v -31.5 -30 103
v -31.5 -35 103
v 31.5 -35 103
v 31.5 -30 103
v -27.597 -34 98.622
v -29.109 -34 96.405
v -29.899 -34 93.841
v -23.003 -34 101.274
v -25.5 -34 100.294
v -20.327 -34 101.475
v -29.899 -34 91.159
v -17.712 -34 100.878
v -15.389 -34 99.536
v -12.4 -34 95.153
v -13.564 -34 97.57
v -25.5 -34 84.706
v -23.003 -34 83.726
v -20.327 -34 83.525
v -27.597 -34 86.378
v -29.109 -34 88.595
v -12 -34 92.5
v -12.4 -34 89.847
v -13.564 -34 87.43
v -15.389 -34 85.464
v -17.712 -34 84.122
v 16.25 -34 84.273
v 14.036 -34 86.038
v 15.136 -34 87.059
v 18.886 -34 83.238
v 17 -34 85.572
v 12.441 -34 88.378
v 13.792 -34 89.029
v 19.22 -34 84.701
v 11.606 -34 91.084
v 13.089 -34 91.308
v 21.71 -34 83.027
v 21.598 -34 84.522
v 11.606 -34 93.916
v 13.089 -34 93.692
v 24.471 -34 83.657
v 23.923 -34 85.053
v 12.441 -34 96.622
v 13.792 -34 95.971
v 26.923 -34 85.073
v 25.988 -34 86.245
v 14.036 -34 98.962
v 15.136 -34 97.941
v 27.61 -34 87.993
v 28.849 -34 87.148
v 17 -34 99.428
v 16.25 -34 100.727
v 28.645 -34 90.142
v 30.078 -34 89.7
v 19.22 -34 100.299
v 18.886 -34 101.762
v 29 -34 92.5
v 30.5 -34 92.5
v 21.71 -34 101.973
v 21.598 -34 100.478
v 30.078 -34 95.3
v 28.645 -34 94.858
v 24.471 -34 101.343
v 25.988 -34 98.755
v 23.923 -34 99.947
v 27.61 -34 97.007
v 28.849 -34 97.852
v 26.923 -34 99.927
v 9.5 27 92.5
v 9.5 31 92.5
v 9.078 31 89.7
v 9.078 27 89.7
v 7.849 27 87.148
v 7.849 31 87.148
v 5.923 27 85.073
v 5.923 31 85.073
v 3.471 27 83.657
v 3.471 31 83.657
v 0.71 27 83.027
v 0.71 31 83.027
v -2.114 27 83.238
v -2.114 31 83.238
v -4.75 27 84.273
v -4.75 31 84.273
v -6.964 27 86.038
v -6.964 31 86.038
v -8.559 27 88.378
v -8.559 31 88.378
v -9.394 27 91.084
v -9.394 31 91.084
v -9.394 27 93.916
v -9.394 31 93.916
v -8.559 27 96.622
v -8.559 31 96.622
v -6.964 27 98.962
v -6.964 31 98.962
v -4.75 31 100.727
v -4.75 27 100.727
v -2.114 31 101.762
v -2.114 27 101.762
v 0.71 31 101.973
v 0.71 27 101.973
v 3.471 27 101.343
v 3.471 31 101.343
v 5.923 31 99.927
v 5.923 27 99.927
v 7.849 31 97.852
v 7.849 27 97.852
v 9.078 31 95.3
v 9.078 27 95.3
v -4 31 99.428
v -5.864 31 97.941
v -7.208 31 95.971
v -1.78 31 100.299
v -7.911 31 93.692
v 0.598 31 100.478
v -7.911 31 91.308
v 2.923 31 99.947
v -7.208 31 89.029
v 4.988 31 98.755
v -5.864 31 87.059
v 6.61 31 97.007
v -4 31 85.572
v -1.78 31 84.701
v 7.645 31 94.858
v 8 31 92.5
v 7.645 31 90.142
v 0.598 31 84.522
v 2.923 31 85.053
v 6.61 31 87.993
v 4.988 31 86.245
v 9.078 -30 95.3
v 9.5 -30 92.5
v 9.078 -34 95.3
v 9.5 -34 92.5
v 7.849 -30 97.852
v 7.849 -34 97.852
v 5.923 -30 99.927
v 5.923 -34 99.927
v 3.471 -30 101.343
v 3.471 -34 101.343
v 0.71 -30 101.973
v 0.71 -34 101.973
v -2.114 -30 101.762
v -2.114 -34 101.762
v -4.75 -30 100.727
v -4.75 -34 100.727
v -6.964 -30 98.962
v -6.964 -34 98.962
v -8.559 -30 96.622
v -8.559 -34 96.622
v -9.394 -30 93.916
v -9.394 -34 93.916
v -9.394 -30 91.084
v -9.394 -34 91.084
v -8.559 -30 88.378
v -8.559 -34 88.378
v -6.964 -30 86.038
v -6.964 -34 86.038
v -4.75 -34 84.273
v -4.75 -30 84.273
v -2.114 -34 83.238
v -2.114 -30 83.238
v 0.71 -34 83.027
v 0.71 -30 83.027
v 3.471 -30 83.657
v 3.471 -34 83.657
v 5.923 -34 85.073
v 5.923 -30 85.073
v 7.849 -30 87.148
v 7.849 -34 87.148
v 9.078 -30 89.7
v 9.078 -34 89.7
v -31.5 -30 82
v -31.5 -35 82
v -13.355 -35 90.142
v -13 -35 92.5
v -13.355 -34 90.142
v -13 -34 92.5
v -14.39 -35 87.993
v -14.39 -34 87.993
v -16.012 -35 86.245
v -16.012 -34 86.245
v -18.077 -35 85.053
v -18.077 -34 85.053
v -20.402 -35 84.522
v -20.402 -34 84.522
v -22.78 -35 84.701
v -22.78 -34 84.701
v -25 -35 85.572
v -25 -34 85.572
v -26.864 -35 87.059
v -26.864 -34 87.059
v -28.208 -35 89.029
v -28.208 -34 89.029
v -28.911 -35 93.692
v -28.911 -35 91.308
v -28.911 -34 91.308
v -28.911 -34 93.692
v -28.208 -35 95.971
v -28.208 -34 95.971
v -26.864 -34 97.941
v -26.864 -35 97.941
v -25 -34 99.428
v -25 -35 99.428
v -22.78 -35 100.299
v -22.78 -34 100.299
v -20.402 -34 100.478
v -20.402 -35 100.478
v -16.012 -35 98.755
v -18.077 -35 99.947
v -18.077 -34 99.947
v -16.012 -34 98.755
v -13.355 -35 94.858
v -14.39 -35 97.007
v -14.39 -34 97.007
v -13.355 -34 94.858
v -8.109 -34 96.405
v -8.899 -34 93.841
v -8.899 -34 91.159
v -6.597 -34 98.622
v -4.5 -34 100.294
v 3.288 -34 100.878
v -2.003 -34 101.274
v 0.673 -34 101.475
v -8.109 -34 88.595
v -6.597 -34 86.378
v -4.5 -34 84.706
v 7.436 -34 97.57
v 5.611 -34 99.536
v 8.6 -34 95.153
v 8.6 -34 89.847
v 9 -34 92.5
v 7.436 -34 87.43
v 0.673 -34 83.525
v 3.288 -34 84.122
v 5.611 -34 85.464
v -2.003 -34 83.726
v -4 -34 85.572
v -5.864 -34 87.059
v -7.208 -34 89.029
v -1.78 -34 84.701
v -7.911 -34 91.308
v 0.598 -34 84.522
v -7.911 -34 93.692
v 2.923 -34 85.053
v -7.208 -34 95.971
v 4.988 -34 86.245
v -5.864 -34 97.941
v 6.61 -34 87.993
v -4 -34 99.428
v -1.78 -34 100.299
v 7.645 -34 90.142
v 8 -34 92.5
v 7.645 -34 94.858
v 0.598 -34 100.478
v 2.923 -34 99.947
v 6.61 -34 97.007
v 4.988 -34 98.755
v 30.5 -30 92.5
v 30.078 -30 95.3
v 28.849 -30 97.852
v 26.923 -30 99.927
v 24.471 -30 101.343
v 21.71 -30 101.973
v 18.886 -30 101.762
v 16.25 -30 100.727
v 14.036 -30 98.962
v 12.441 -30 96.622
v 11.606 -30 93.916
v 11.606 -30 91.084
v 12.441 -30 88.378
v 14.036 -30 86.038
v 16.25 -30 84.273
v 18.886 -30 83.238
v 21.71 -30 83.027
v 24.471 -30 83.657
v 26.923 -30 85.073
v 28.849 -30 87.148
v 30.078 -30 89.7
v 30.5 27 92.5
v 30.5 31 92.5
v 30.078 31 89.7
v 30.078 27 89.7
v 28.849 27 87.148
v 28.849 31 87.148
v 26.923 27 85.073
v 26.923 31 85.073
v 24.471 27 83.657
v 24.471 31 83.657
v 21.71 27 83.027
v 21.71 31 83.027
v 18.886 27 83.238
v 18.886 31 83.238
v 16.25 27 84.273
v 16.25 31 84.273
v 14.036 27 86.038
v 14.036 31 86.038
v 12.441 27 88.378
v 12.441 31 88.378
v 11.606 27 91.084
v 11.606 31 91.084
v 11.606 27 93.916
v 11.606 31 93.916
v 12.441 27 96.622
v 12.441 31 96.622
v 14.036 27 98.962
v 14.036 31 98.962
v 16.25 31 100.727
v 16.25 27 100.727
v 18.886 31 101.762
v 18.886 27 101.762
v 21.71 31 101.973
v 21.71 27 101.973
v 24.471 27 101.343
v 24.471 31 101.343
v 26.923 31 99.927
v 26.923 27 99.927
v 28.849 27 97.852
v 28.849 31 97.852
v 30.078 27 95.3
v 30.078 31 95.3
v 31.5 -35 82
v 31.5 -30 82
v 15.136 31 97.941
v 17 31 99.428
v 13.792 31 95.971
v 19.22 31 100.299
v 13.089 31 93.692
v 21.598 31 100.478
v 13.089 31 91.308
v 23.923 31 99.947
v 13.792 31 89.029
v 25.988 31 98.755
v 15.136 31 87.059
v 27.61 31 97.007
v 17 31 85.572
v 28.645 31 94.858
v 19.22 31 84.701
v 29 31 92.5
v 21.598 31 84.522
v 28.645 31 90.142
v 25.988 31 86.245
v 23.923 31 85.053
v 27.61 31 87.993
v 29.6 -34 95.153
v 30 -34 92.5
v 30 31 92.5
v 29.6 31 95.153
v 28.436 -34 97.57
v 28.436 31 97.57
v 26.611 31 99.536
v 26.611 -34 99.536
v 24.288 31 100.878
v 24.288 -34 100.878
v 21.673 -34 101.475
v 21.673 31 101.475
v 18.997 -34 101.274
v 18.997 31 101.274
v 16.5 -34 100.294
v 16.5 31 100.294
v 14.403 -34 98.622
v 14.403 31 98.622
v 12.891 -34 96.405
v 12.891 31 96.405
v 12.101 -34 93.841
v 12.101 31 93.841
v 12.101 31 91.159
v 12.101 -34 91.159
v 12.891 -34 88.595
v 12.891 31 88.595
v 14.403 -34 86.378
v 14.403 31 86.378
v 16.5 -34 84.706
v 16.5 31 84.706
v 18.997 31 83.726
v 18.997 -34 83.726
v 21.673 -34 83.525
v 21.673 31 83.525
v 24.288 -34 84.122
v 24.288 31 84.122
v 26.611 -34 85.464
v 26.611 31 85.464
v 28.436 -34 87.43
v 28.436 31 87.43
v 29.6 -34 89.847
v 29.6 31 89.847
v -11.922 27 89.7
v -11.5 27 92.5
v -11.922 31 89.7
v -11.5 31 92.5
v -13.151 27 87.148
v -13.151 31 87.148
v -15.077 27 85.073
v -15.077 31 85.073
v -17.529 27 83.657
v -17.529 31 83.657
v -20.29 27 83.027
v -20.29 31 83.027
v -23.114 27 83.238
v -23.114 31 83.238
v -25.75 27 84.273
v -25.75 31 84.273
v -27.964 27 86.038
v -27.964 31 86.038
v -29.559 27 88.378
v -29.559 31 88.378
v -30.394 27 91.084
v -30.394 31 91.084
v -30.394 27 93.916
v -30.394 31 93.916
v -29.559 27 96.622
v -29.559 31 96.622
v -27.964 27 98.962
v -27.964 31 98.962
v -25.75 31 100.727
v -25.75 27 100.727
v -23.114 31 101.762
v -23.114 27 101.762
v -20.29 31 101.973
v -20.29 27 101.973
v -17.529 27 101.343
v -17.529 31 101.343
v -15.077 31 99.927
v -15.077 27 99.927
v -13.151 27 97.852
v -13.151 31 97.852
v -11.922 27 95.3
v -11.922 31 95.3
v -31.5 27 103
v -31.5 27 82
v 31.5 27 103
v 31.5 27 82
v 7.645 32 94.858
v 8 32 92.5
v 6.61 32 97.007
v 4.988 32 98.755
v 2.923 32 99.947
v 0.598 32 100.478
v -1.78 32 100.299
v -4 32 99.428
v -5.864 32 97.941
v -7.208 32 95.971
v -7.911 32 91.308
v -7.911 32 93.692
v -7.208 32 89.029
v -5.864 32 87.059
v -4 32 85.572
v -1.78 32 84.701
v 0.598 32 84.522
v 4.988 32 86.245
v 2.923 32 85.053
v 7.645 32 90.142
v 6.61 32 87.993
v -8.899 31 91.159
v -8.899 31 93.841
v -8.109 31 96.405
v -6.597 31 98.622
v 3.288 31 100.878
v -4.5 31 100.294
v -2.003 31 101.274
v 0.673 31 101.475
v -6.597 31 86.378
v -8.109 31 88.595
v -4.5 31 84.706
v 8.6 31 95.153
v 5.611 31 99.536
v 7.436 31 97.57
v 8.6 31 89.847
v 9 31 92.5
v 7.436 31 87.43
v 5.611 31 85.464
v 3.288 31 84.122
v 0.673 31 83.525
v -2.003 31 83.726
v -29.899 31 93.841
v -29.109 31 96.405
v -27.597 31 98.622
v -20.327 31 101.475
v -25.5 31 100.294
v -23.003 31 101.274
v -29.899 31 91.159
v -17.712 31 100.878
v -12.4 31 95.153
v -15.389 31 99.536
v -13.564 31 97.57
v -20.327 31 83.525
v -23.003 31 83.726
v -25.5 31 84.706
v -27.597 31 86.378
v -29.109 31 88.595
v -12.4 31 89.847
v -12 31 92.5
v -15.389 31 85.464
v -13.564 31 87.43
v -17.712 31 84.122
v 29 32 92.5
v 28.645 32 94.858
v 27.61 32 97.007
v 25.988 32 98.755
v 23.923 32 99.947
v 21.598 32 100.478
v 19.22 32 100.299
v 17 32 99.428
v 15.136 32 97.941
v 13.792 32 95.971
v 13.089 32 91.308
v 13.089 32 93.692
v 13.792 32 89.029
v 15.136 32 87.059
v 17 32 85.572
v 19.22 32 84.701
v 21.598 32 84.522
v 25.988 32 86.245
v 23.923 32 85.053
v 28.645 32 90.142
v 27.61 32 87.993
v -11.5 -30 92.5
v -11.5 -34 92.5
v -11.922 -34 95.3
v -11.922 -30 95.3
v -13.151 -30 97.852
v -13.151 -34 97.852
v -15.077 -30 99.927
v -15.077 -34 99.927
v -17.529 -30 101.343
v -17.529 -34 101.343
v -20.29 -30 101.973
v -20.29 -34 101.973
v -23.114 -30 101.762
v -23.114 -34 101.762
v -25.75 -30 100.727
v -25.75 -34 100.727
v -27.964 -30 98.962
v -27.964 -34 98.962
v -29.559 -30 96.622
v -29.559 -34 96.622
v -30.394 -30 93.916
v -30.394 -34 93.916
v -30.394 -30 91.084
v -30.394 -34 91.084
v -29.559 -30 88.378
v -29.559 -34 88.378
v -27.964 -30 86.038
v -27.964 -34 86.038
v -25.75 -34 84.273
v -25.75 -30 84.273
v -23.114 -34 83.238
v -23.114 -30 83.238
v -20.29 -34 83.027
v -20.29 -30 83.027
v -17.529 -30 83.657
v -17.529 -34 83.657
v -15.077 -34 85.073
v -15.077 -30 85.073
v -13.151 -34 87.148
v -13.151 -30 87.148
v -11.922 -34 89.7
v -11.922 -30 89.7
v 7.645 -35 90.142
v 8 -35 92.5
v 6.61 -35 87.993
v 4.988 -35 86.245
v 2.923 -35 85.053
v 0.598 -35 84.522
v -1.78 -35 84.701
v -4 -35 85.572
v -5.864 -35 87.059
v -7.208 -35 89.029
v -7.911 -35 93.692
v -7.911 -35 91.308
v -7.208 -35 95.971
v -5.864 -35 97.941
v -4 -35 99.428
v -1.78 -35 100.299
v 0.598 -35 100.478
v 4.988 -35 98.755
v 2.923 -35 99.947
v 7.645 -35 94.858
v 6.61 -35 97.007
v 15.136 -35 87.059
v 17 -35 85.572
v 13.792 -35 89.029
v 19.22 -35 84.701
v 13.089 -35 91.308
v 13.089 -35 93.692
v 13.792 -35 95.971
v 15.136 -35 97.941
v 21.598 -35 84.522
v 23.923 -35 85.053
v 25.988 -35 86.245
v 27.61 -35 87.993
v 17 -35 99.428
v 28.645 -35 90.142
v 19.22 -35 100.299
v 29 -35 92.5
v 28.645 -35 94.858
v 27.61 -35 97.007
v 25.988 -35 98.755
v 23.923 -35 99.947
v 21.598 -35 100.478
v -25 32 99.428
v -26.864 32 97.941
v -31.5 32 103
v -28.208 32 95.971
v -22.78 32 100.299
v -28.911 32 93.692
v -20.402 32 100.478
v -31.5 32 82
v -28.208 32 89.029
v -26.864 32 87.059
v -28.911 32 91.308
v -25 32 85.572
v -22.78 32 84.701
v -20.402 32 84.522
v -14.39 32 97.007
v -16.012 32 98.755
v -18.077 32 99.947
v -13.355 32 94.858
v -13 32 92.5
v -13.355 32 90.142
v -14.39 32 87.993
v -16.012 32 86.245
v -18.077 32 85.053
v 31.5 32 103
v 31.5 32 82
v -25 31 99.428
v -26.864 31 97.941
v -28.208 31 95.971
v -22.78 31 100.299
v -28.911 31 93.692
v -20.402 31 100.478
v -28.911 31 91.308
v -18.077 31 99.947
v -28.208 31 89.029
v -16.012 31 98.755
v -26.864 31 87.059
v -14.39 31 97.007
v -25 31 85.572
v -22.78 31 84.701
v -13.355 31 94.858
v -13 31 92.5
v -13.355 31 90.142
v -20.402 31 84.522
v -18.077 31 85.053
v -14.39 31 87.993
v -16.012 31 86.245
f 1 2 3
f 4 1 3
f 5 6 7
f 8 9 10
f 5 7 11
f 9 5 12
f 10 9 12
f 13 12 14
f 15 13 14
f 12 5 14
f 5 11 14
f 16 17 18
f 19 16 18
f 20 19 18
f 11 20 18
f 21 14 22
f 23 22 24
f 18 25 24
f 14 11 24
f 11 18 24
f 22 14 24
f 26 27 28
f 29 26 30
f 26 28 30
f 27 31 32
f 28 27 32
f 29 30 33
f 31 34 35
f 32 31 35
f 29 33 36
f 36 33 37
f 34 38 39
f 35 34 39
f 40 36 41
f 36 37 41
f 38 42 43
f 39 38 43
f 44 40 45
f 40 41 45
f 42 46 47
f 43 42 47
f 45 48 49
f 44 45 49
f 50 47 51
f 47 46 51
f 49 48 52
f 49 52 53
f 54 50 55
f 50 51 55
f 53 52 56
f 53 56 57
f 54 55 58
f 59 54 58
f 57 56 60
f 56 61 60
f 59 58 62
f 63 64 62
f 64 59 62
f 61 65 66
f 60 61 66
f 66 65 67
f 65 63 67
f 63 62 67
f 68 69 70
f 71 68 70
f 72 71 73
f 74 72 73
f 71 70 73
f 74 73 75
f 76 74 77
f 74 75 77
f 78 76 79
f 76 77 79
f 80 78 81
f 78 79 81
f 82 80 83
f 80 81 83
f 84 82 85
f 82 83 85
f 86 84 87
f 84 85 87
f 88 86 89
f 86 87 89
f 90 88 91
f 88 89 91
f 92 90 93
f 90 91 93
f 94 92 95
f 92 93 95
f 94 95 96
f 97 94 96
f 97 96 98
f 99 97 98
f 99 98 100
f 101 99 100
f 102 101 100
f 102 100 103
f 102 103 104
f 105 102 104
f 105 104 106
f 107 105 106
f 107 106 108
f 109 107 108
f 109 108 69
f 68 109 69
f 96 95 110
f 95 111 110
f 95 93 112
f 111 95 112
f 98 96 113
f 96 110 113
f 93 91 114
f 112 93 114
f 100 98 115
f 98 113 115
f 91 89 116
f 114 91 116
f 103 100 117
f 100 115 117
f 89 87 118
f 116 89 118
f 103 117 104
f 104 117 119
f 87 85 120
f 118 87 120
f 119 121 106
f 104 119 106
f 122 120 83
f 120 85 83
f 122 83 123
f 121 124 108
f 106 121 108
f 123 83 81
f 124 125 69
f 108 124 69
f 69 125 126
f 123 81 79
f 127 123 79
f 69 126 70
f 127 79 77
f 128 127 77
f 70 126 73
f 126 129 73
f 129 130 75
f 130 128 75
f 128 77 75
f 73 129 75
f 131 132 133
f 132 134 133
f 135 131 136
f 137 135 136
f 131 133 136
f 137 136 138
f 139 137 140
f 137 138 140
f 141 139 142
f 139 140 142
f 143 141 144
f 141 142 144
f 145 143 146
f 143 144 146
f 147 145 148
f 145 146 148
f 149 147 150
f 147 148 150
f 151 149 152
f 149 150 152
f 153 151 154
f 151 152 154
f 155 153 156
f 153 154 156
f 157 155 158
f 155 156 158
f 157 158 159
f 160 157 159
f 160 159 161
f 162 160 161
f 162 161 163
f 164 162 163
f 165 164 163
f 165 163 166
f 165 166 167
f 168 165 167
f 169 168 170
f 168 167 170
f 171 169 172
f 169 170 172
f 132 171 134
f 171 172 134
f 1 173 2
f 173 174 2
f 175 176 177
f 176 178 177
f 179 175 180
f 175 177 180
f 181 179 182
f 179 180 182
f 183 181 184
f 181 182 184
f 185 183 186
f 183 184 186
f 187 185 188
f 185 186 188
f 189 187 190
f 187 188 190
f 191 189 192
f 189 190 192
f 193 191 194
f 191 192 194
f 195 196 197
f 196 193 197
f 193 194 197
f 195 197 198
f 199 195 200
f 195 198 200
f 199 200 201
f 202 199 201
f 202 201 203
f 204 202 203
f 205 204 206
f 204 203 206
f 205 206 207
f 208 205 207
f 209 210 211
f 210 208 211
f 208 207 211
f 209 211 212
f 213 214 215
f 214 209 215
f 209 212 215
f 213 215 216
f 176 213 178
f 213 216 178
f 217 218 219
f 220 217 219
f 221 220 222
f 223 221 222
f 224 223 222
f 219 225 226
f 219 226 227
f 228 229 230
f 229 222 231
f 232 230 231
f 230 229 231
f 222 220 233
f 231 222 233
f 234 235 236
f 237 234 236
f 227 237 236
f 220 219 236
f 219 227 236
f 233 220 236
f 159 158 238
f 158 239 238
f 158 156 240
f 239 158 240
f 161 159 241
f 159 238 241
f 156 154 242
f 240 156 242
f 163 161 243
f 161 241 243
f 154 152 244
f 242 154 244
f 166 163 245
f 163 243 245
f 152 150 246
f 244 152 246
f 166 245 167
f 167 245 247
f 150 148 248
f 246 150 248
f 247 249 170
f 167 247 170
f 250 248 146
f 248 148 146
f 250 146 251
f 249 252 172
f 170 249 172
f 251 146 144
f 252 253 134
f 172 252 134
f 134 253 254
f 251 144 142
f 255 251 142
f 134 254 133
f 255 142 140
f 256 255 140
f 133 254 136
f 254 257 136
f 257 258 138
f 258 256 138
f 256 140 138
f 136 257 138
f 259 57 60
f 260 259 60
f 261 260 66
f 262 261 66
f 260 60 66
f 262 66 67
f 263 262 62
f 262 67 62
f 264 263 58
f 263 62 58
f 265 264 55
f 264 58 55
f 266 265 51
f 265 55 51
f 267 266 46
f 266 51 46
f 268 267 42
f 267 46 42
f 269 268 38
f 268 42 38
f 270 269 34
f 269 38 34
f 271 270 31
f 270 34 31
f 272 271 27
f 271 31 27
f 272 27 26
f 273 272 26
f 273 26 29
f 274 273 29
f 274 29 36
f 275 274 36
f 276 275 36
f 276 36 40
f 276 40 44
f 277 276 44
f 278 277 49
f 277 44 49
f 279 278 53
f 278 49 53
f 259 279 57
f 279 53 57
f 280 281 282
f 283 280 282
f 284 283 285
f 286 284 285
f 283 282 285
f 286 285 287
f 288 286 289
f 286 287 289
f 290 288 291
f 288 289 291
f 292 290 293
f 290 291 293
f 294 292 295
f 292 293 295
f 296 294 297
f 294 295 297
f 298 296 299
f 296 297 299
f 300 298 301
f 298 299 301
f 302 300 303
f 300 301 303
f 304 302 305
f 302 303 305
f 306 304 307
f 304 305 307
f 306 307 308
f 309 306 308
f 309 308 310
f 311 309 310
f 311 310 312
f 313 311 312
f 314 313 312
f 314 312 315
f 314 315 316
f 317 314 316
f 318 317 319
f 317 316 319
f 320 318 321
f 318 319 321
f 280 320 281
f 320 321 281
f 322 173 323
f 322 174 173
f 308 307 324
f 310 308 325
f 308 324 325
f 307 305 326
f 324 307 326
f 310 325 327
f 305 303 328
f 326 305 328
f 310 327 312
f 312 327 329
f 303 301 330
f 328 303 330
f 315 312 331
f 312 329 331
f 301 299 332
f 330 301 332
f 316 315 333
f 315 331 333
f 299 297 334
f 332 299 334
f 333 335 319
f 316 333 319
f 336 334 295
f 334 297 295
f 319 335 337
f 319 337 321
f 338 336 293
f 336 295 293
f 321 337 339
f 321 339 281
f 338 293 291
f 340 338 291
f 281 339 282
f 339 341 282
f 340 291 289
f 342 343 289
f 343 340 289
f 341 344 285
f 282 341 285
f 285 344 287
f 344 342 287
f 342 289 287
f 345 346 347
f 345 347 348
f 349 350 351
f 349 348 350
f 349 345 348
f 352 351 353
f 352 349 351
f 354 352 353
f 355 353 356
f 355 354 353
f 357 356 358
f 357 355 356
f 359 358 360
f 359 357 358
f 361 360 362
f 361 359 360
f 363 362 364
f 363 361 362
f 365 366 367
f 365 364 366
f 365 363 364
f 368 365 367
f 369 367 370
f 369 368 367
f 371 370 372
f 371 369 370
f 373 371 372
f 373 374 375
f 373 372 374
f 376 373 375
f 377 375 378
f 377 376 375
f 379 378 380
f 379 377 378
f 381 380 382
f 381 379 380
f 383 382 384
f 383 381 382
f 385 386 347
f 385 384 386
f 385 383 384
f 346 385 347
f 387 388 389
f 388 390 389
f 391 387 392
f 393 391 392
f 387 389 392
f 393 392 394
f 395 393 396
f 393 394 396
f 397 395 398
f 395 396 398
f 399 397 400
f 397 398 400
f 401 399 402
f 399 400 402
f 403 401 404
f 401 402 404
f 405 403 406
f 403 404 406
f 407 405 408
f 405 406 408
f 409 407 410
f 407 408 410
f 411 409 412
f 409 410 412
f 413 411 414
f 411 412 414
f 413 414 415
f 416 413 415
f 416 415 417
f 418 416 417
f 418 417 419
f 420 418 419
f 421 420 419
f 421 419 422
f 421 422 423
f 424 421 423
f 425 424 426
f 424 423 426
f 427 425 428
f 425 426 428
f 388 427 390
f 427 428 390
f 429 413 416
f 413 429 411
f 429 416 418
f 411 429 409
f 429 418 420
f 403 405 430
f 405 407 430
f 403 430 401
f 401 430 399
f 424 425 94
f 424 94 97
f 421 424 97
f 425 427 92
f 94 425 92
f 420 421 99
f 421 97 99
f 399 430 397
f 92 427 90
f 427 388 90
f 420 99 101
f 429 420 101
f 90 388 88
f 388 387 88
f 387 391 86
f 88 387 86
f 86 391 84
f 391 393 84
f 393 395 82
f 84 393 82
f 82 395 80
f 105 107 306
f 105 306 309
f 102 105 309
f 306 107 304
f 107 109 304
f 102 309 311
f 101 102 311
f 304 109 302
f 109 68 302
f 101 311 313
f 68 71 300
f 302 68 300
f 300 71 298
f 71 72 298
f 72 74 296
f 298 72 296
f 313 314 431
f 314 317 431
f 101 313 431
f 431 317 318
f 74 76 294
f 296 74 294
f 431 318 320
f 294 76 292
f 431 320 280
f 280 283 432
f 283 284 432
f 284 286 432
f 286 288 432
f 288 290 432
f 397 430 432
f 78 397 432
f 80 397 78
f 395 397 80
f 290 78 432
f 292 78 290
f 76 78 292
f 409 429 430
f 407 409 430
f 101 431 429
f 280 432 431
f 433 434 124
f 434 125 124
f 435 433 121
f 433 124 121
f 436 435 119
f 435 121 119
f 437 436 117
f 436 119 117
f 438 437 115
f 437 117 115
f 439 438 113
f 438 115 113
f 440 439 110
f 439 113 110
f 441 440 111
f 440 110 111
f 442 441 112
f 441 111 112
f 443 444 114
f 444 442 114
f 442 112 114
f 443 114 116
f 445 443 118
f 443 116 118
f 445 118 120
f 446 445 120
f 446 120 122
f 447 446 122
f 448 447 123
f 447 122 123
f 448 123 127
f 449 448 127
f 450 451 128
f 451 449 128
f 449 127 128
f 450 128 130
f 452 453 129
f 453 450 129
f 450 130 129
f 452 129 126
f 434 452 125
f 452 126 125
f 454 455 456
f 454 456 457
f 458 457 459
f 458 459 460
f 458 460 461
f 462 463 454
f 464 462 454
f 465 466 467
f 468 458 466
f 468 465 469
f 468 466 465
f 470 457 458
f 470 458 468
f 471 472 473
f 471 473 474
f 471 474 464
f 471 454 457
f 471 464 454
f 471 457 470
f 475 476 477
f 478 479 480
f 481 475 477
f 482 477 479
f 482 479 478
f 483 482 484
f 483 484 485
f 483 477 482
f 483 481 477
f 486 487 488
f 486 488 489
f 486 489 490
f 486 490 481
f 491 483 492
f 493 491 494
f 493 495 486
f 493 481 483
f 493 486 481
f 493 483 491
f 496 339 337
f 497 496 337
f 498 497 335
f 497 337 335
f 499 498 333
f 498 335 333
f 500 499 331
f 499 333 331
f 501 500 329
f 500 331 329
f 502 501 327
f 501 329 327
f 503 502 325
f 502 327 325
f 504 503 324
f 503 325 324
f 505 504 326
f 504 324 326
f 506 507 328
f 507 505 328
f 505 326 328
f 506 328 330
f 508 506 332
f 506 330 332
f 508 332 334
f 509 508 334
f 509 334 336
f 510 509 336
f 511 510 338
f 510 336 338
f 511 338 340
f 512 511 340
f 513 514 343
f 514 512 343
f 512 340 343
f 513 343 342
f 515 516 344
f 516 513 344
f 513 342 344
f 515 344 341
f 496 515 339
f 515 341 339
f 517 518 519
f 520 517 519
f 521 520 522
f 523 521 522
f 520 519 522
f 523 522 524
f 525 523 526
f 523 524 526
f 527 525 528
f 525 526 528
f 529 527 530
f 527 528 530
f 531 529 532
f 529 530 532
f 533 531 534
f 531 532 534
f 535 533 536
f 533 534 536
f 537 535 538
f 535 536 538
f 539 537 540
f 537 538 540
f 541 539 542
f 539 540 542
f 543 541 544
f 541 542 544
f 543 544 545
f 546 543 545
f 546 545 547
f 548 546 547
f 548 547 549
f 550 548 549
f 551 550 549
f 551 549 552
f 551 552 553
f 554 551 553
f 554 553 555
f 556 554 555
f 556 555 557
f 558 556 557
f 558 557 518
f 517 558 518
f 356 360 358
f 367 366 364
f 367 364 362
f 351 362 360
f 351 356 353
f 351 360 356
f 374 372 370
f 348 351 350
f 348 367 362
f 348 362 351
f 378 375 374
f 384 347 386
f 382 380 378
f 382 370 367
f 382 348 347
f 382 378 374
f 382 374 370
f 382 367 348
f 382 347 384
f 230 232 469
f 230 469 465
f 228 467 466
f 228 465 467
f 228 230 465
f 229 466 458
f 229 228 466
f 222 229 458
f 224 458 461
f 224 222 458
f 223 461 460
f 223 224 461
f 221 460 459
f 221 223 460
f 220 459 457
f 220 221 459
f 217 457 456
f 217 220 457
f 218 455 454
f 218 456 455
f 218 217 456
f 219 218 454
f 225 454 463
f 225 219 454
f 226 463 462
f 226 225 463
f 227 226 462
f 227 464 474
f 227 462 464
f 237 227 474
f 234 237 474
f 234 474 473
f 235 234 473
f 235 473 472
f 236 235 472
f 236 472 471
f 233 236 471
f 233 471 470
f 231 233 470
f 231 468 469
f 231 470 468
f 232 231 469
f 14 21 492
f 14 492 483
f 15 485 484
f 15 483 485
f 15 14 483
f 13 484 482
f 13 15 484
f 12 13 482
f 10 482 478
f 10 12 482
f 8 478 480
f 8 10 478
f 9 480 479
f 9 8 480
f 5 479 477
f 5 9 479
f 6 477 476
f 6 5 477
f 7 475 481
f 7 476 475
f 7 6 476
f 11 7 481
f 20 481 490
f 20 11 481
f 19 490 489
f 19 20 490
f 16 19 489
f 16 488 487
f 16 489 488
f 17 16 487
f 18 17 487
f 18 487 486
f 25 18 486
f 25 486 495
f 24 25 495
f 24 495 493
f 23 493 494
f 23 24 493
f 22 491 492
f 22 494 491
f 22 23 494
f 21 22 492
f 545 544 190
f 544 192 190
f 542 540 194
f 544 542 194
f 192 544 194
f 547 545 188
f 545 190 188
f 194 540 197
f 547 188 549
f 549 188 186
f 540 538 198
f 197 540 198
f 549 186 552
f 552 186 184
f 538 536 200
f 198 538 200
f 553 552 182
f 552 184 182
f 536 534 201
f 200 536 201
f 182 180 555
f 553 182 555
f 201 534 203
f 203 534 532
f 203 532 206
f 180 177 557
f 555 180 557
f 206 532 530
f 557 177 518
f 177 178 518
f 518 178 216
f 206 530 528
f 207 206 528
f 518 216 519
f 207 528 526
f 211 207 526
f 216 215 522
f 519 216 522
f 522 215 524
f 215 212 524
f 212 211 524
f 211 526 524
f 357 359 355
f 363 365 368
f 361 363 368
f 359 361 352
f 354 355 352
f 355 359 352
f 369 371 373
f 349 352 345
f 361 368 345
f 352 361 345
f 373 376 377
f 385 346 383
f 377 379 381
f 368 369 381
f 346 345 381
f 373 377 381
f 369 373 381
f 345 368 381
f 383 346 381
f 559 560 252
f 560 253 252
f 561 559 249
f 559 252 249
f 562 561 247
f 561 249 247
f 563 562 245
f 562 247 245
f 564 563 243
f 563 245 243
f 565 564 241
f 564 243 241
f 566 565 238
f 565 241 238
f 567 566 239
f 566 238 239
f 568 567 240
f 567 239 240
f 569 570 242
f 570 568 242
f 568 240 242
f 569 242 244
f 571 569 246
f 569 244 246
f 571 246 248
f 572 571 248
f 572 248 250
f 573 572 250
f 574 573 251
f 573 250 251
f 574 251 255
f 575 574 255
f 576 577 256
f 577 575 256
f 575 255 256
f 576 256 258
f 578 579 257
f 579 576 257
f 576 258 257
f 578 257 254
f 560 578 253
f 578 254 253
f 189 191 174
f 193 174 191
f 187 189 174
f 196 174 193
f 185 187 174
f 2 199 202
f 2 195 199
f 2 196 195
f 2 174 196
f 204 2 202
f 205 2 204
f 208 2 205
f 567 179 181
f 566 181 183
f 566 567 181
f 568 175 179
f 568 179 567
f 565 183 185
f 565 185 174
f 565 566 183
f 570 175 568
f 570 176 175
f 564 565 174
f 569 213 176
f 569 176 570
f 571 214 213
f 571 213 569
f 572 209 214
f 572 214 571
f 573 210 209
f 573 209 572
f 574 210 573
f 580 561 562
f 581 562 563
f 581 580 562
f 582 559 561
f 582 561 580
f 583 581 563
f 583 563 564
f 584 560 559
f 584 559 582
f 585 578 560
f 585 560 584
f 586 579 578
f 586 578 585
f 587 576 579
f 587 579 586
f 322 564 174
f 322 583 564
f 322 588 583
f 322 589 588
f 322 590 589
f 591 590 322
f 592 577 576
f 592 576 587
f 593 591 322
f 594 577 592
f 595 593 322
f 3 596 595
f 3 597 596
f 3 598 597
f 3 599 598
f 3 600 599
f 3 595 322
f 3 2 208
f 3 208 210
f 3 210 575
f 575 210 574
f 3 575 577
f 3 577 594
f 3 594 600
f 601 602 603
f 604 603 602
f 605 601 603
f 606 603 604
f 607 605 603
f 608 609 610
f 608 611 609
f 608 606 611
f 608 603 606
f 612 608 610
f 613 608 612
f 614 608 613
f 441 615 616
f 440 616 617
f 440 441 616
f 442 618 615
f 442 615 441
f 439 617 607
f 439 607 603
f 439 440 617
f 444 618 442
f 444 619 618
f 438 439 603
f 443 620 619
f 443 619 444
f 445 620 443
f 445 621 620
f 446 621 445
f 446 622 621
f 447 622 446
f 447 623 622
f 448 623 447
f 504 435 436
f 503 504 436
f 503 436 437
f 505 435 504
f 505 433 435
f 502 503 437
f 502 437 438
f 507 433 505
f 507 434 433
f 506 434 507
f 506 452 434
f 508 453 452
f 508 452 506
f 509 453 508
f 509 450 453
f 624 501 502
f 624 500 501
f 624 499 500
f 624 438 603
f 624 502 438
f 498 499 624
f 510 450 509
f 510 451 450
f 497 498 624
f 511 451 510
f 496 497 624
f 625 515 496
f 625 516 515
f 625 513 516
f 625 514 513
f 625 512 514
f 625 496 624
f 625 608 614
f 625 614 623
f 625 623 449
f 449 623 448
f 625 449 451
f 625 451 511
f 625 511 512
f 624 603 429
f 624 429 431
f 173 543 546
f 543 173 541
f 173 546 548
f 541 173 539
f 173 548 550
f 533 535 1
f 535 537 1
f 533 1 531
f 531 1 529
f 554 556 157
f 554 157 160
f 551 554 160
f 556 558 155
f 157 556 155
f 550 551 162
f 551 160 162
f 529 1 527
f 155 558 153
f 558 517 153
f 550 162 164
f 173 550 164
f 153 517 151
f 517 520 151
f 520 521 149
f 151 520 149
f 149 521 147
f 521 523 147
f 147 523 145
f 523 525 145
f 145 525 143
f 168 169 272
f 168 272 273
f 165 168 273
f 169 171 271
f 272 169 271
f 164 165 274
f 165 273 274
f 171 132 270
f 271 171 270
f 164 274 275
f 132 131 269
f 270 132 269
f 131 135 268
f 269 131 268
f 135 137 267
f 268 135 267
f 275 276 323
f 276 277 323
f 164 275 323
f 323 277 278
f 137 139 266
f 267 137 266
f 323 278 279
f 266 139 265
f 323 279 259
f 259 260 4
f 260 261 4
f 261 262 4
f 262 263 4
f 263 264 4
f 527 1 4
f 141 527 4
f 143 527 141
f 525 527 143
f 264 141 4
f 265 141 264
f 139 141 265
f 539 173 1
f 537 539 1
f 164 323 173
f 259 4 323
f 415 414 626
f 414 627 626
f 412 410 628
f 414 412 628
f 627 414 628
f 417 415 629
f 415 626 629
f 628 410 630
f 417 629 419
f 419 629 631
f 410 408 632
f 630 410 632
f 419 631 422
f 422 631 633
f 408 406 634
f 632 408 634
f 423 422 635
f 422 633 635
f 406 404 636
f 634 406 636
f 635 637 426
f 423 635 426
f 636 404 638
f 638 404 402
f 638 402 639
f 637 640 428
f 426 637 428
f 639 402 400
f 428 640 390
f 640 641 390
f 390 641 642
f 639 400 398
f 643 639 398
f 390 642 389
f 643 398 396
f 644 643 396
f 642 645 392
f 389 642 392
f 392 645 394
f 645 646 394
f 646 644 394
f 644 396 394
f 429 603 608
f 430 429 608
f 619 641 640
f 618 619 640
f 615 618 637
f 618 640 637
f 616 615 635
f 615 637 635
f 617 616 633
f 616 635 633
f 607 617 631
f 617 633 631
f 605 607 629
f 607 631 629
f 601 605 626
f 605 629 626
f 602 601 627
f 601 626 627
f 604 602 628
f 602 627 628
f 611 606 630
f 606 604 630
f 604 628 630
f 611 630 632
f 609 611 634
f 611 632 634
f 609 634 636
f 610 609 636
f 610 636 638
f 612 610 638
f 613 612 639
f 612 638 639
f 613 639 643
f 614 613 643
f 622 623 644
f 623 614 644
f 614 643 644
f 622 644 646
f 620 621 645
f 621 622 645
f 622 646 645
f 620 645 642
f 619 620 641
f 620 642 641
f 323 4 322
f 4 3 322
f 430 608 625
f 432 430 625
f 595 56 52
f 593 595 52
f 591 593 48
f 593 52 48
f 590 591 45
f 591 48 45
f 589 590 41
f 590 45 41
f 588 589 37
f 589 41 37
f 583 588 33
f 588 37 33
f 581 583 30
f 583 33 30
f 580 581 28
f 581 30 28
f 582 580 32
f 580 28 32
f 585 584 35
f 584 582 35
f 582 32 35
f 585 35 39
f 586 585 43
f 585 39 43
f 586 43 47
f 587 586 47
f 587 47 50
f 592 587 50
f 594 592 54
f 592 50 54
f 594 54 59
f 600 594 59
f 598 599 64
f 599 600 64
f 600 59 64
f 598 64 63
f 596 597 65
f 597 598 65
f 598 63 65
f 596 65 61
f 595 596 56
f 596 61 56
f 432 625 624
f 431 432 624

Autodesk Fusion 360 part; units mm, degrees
sketch "Sketch2" plane through (0, 0, 0) normal (0, 1, 0) x (1, 0, 0) in component "Battery"
  circle A0 centre (0, 0) radius 9
  dimension "d91" = 18
extrude "Extrude2" add sketch "Sketch2" along normal blind 65 makes body 1 in component "Battery"
sketch "Sketch2 (2)" plane through (0, 0, 0) normal (0, -1, 0) x (1, 0, 0) in component "Holder"
  circle A0 centre (0, 0) radius 9 construction
  circle A1 centre (0, 0) radius 9.5
  circle A2 centre (0, 0) radius 10.5
  circle A3 centre (0, 0) radius 8
  line L0 (10.5, 10.5) -> (10.5, -10.5) construction
  line L1 (10.5, -10.5) -> (0, -10.5)
  line L2 (10.5, 10.5) -> (0, 10.5)
  circle A4 centre (21, 0) radius 10.5
  circle A5 centre (21, 0) radius 9.5
  circle A6 centre (21, 0) radius 8
  line L3 (10.5, 10.5) -> (21, 10.5)
  line L4 (10.5, -10.5) -> (21, -10.5)
  line L5 (31.5, 10.5) -> (31.5, -10.5) construction
  circle A7 centre (42, 0) radius 10.5
  circle A8 centre (42, 0) radius 9.5
  circle A9 centre (42, 0) radius 8
  line L6 (52.5, -10.5) -> (-10.5, -10.5)
  line L7 (-10.5, -10.5) -> (-10.5, 10.5)
  line L8 (-10.5, 10.5) -> (52.5, 10.5)
  line L9 (52.5, 10.5) -> (52.5, -10.5)
  line L10 (52.5, -10.5) -> (-10.5, 10.5) construction
  line L11 (-10.5, -10.5) -> (52.5, 10.5) construction
  circle A10 centre (21, 0) radius 9 construction
  circle A11 centre (42, 0) radius 9 construction
  point P0 (21, 0)
  dimension "d94" = 0.5
  dimension "d95" = 1.5
  dimension "d96" = -1
extrude "Extrude1" add sketch "Sketch2 (2)" against normal blind 4 separate body contours A2 | A2 L1 A4 L4 L6 | A2 L2 A4 L3 L8 | A4 | A2 L7 L8 | A2 L6 L7 | A4 A7 L8 | A4 A7 L6 | A7 | A7 L8 L9 | A7 L6 L9 makes body 2 in component "Holder"
extrude "Extrude2'" add sketch "Sketch2 (2)" along normal blind 1 contours A1 | A2 | A2 L1 A4 L4 L6 | A2 L2 A4 L3 L8 | A4 | A2 L7 L8 | A2 L6 L7 | A4 A7 L8 | A4 A7 L6 | A7 | A7 L8 L9 | A7 L6 L9 | A5 | A8 bodies 2 in component "Holder"
component "Battery" placed x (1, 0, 0) y (0, 1, 0) z (0, 0, 1) at (-21, -34, 92.5)
component "Holder" placed x (1, 0, 0) y (0, 1, 0) z (0, 0, 1) at (-21, -34, 92.5)
component "Battery" placed x (1, 0, 0) y (0, 1, 0) z (0, 0, 1) at (0, -34, 92.5)
component "Battery" placed x (1, 0, 0) y (0, 1, 0) z (0, 0, 1) at (21, -34, 92.5)
component "Holder" placed x (1, 0, 0) y (0, -1, 0) z (0, 0, -1) at (-21, 31, 92.5)
